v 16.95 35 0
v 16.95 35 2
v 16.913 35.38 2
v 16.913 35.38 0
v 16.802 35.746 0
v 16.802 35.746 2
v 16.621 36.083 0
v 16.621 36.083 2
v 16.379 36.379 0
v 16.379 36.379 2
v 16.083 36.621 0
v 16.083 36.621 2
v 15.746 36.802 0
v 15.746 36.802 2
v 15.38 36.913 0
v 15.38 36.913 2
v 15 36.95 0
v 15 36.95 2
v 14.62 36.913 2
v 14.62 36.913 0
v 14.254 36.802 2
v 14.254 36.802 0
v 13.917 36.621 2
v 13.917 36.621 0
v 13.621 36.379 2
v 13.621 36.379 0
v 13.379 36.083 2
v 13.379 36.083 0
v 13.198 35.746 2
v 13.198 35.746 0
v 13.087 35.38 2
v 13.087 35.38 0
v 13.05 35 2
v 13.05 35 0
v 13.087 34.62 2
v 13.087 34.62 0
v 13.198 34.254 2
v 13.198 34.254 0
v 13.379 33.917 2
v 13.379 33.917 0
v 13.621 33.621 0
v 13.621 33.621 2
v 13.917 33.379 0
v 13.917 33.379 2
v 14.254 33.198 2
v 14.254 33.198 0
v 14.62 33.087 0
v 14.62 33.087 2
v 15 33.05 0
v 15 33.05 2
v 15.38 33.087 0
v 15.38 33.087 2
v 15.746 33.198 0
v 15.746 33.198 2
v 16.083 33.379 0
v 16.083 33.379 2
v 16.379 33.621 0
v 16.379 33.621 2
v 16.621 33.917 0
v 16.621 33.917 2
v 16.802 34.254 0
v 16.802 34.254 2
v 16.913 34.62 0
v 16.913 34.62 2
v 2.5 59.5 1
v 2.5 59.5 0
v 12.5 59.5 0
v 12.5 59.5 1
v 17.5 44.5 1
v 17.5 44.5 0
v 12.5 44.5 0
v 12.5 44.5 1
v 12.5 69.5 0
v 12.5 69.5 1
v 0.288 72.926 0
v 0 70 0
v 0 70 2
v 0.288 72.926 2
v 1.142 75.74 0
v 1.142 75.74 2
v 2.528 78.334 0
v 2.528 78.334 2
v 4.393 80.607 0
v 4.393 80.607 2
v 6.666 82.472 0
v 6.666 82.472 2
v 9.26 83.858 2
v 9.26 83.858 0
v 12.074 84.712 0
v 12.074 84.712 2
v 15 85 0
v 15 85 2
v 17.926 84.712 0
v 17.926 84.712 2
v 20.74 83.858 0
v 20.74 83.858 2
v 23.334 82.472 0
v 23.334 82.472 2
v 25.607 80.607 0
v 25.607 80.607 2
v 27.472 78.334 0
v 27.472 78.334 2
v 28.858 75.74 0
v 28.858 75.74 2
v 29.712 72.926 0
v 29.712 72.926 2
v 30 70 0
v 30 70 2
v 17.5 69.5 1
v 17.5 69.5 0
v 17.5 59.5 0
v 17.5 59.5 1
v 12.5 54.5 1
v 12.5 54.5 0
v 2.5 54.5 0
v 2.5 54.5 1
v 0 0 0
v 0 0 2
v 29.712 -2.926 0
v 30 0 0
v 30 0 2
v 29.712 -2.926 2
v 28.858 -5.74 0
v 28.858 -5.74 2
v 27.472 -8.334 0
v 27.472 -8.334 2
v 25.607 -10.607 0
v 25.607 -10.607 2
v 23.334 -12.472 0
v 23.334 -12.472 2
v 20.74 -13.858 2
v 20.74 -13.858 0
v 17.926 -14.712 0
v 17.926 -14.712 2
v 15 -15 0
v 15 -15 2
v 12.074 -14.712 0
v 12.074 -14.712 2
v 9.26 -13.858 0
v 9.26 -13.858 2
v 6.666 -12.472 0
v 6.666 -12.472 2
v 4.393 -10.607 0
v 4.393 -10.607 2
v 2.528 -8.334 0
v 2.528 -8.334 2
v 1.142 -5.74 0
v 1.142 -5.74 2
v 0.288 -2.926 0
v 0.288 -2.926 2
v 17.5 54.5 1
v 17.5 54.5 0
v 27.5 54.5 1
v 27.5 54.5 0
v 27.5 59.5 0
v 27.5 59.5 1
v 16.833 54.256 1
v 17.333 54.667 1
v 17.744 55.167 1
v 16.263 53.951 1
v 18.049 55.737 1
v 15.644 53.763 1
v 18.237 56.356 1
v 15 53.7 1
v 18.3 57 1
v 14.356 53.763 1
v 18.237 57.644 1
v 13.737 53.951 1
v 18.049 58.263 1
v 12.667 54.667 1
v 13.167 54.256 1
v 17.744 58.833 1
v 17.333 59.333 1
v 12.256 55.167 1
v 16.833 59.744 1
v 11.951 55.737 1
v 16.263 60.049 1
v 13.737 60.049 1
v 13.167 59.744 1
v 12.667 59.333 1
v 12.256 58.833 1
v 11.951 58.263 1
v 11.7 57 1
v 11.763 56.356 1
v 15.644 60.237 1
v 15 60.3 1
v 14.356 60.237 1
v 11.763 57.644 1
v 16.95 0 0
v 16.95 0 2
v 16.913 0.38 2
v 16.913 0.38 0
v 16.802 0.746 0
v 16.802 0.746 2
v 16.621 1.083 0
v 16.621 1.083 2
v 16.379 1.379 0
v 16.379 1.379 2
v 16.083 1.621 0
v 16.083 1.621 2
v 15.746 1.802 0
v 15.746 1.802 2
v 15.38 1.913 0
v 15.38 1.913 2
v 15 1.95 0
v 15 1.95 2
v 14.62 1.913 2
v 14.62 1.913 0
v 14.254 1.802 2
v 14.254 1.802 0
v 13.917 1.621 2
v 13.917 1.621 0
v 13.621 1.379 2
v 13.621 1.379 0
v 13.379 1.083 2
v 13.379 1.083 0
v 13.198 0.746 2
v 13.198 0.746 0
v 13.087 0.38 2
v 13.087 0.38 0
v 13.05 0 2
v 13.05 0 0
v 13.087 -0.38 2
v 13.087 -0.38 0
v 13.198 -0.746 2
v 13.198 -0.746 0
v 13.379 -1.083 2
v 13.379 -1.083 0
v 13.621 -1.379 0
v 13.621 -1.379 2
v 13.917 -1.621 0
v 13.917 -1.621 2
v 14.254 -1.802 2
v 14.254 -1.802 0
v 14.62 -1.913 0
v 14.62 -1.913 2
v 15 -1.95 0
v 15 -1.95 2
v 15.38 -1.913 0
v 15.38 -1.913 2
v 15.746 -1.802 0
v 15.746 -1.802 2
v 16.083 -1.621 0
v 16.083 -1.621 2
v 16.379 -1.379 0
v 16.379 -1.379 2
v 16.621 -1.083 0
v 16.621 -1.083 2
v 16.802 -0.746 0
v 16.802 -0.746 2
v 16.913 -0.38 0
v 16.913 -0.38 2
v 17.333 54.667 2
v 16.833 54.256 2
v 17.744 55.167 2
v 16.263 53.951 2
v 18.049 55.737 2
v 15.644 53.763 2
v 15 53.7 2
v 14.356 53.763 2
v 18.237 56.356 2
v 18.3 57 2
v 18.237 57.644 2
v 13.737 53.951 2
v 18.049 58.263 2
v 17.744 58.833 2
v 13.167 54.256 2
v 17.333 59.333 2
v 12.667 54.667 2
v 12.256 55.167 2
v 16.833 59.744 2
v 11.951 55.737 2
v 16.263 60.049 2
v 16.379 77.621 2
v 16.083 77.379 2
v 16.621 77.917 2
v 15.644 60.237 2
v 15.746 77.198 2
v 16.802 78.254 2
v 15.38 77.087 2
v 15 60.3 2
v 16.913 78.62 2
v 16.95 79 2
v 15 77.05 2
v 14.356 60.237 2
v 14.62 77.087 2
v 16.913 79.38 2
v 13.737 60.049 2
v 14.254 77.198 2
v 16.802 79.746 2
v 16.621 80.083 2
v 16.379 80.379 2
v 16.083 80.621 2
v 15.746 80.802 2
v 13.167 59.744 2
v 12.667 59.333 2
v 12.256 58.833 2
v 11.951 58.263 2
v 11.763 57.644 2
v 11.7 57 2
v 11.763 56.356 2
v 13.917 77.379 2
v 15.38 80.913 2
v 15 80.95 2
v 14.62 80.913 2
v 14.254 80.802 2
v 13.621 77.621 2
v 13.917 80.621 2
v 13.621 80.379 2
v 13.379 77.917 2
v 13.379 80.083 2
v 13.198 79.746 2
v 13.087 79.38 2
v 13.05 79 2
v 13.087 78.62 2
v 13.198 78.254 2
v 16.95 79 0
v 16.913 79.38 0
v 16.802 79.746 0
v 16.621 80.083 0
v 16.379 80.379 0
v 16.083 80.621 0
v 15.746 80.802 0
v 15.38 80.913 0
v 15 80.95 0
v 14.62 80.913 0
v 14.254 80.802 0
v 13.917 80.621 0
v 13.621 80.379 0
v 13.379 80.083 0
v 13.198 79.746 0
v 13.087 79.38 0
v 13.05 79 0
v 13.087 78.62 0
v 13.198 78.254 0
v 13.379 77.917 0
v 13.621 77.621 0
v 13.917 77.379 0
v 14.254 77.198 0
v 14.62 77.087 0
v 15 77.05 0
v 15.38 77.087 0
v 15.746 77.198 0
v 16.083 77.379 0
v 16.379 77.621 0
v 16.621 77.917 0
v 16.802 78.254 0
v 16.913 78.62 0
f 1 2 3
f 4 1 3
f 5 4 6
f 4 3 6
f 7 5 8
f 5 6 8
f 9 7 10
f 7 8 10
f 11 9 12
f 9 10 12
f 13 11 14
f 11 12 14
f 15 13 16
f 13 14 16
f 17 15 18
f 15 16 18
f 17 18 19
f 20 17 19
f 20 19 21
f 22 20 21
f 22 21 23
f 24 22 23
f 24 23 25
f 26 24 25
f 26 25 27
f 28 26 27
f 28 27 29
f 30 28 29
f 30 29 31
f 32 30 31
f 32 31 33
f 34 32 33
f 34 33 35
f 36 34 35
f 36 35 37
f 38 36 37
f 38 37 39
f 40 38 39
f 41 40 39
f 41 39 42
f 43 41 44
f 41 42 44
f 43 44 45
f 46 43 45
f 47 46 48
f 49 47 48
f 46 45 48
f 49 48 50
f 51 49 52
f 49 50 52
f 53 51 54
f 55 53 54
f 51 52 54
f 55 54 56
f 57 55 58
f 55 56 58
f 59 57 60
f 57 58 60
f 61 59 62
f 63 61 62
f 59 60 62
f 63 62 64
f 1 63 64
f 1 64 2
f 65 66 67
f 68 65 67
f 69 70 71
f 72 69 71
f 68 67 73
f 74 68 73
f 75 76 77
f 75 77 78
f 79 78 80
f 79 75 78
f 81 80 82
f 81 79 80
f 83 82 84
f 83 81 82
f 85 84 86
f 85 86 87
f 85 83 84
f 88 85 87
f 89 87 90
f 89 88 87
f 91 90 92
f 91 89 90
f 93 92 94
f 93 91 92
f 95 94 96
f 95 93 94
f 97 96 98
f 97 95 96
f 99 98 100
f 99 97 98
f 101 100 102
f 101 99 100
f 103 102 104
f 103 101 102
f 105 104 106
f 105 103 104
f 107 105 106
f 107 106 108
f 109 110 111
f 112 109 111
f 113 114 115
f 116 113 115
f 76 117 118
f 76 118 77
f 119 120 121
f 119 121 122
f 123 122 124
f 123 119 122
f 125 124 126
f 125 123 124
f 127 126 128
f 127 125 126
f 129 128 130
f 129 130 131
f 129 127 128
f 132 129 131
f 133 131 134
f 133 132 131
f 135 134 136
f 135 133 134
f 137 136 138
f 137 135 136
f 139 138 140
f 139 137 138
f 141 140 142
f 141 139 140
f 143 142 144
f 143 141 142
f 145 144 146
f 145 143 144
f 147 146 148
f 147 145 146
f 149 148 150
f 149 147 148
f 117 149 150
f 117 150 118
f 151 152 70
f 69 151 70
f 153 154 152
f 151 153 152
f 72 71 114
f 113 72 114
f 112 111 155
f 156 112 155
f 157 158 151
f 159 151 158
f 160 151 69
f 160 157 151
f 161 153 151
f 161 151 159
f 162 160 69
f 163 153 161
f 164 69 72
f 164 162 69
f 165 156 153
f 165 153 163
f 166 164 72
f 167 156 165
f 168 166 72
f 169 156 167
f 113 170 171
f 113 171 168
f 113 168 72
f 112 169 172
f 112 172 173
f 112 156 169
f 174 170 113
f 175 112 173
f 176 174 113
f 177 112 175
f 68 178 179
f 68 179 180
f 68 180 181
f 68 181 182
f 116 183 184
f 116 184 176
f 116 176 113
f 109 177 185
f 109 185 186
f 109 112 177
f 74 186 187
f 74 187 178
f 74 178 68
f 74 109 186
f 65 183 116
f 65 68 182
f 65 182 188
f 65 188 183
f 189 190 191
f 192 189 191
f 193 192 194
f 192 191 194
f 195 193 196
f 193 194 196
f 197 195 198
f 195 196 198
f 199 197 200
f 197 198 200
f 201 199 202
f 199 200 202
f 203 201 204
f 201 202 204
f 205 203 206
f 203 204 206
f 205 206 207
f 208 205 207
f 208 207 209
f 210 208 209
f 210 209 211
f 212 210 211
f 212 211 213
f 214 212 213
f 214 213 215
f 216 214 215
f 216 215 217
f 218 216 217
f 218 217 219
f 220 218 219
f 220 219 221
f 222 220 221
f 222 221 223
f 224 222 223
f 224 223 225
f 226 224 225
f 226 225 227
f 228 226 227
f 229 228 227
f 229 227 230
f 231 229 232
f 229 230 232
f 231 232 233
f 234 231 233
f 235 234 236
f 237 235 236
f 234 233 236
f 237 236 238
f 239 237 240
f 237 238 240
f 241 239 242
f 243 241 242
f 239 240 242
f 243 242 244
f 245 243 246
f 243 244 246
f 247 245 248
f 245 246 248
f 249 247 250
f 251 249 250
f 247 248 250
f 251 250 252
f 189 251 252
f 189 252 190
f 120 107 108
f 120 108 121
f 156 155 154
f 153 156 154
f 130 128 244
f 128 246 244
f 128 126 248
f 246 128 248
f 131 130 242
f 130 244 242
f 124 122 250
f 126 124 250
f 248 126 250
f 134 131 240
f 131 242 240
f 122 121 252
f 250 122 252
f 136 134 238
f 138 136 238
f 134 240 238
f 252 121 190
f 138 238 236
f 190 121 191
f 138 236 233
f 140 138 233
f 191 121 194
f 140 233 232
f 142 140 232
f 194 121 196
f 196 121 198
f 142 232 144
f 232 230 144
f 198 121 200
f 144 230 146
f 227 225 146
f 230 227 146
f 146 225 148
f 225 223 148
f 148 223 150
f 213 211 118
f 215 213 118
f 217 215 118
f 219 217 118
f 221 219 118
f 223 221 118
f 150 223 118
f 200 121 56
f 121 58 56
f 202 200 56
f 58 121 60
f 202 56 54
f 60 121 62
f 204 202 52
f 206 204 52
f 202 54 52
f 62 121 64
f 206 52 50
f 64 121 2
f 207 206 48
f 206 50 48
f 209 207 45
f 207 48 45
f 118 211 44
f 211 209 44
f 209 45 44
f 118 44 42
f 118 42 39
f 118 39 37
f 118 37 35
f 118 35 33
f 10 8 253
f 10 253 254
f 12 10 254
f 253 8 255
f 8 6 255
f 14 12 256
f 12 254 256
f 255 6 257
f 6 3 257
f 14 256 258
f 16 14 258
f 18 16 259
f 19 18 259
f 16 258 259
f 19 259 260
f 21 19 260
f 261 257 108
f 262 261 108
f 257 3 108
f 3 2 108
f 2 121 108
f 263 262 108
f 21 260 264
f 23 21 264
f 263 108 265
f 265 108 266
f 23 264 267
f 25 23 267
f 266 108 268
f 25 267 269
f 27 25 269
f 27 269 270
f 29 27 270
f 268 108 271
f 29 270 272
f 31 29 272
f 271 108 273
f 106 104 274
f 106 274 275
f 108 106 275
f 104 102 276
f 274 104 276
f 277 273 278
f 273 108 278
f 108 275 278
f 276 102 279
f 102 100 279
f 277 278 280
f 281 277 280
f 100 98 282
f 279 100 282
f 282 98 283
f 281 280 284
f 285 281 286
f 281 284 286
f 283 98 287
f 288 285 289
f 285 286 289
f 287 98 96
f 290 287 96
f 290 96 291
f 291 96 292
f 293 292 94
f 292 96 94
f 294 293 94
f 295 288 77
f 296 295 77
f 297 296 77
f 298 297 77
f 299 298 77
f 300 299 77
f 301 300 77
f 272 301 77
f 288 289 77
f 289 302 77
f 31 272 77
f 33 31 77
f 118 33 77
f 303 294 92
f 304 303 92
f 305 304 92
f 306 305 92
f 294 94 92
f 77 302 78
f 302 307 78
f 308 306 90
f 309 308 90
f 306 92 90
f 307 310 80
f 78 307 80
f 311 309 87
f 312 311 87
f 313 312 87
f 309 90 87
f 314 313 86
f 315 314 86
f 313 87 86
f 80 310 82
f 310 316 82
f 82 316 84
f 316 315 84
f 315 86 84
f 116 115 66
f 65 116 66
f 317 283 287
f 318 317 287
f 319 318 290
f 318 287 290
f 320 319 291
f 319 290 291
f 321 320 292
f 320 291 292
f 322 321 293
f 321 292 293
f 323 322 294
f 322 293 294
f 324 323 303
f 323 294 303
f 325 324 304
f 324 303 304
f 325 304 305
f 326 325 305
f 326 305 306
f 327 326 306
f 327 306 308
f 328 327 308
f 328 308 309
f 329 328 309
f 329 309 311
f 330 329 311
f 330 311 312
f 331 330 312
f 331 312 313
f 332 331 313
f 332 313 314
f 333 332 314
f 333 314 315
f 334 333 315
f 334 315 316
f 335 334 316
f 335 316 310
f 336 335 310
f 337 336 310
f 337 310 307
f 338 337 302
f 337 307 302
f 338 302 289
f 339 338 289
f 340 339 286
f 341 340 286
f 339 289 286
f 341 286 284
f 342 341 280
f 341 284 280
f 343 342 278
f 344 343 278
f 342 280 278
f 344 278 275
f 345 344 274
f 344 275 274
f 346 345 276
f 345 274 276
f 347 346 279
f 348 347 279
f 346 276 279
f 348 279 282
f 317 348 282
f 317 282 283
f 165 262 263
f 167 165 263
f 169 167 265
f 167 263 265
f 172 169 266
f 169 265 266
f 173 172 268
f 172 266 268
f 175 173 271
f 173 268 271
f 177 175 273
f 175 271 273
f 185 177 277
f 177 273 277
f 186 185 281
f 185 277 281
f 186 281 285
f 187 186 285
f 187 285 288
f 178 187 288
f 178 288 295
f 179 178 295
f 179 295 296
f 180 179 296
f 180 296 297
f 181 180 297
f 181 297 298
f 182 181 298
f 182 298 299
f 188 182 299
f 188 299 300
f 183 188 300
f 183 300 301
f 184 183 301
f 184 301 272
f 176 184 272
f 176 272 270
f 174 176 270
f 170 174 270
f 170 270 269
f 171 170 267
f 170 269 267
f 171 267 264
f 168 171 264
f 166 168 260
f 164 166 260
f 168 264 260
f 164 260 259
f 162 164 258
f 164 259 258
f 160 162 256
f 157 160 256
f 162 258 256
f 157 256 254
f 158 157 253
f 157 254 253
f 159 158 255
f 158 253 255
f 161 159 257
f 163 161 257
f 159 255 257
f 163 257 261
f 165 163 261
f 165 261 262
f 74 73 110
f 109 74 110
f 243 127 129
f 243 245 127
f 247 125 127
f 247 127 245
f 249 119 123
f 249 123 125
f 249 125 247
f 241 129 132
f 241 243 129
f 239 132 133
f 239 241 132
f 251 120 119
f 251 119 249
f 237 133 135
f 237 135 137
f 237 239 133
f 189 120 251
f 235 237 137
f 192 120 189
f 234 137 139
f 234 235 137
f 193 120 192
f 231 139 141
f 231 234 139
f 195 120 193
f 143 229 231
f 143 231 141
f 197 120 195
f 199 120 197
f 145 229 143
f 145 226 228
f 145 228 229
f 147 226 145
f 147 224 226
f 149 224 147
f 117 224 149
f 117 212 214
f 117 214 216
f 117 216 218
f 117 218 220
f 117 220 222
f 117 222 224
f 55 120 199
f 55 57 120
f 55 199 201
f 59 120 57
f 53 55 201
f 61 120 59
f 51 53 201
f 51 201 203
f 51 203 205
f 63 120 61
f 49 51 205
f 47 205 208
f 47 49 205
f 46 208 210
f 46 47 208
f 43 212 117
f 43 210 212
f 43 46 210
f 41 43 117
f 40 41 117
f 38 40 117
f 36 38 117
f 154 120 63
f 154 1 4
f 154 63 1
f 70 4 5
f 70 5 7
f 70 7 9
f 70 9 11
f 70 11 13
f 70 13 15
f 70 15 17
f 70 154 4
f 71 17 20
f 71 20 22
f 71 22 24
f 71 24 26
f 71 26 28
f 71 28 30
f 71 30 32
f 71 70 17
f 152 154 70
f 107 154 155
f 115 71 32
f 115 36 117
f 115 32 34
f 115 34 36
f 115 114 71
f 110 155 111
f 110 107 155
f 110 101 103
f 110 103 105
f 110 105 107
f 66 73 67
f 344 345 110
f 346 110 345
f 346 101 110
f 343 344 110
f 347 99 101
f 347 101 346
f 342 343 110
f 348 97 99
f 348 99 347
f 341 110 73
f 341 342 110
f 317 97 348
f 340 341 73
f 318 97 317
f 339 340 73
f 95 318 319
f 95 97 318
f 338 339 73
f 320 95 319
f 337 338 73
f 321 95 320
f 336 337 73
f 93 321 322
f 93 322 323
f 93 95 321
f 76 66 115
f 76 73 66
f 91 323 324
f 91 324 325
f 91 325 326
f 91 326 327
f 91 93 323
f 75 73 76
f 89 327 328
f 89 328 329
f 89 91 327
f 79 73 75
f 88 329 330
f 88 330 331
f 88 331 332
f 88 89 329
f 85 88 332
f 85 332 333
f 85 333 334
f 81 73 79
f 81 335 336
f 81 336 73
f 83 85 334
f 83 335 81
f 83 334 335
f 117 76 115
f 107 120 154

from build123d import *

# Parameters (mm, degrees)
BOSS_EXTRU_1_DEPTH      = 2
D_GAGEMENT_M3_51_D      = 3.9
ENL_V_MAT_EXTRU_3_DEPTH = 1
D_GAGEMENT_M3_52_D      = 3.9
D_GAGEMENT_M61_D        = 6.6


with BuildPart() as part:
    # Esquisse1 → Boss.-Extru.1 (new body)
    with BuildSketch(Plane.XY):
        with BuildLine():
            ThreePointArc((30, 0), (15, -15), (0, 0))
            Line((0, 0), (0, 70))
            ThreePointArc((0, 70), (15, 85), (30, 70))
            Line((30, 70), (30, 0))
        make_face()
    extrude(amount=BOSS_EXTRU_1_DEPTH)

    # Dégagement M3.51 (through all)
    with Locations(Plane(origin=(0, 0, 0), x_dir=(-1, 0, 0), z_dir=(0, 0, -1))):
        with Locations((-15, 79), (-15, 35)):
            Hole(D_GAGEMENT_M3_51_D / 2)

    # Esquisse5 → Enlèv. mat.-Extru.3 (cut)
    with BuildSketch(Plane(origin=(0, 0, 0), x_dir=(-1, 0, 0), z_dir=(0, 0, -1))):
        Polygon((-12.5, 54.5), (-2.5, 54.5), (-2.5, 59.5), (-12.5, 59.5), (-12.5, 69.5), (-17.5, 69.5), (-17.5, 59.5), (-27.5, 59.5), (-27.5, 54.5), (-17.5, 54.5), (-17.5, 44.5), (-12.5, 44.5), align=None)
    extrude(amount=-ENL_V_MAT_EXTRU_3_DEPTH, mode=Mode.SUBTRACT)

    # Dégagement M3.52 (through all)
    with Locations(Plane(origin=(0, 0, 0), x_dir=(-1, 0, 0), z_dir=(0, 0, -1))):
        with Locations((-15, 0)):
            Hole(D_GAGEMENT_M3_52_D / 2)

    # Dégagement M61 (through all)
    with Locations(Plane(origin=(0, 0, 0), x_dir=(-1, 0, 0), z_dir=(0, 0, -1))):
        with Locations((-15, 57)):
            Hole(D_GAGEMENT_M61_D / 2)


solid = part.part
